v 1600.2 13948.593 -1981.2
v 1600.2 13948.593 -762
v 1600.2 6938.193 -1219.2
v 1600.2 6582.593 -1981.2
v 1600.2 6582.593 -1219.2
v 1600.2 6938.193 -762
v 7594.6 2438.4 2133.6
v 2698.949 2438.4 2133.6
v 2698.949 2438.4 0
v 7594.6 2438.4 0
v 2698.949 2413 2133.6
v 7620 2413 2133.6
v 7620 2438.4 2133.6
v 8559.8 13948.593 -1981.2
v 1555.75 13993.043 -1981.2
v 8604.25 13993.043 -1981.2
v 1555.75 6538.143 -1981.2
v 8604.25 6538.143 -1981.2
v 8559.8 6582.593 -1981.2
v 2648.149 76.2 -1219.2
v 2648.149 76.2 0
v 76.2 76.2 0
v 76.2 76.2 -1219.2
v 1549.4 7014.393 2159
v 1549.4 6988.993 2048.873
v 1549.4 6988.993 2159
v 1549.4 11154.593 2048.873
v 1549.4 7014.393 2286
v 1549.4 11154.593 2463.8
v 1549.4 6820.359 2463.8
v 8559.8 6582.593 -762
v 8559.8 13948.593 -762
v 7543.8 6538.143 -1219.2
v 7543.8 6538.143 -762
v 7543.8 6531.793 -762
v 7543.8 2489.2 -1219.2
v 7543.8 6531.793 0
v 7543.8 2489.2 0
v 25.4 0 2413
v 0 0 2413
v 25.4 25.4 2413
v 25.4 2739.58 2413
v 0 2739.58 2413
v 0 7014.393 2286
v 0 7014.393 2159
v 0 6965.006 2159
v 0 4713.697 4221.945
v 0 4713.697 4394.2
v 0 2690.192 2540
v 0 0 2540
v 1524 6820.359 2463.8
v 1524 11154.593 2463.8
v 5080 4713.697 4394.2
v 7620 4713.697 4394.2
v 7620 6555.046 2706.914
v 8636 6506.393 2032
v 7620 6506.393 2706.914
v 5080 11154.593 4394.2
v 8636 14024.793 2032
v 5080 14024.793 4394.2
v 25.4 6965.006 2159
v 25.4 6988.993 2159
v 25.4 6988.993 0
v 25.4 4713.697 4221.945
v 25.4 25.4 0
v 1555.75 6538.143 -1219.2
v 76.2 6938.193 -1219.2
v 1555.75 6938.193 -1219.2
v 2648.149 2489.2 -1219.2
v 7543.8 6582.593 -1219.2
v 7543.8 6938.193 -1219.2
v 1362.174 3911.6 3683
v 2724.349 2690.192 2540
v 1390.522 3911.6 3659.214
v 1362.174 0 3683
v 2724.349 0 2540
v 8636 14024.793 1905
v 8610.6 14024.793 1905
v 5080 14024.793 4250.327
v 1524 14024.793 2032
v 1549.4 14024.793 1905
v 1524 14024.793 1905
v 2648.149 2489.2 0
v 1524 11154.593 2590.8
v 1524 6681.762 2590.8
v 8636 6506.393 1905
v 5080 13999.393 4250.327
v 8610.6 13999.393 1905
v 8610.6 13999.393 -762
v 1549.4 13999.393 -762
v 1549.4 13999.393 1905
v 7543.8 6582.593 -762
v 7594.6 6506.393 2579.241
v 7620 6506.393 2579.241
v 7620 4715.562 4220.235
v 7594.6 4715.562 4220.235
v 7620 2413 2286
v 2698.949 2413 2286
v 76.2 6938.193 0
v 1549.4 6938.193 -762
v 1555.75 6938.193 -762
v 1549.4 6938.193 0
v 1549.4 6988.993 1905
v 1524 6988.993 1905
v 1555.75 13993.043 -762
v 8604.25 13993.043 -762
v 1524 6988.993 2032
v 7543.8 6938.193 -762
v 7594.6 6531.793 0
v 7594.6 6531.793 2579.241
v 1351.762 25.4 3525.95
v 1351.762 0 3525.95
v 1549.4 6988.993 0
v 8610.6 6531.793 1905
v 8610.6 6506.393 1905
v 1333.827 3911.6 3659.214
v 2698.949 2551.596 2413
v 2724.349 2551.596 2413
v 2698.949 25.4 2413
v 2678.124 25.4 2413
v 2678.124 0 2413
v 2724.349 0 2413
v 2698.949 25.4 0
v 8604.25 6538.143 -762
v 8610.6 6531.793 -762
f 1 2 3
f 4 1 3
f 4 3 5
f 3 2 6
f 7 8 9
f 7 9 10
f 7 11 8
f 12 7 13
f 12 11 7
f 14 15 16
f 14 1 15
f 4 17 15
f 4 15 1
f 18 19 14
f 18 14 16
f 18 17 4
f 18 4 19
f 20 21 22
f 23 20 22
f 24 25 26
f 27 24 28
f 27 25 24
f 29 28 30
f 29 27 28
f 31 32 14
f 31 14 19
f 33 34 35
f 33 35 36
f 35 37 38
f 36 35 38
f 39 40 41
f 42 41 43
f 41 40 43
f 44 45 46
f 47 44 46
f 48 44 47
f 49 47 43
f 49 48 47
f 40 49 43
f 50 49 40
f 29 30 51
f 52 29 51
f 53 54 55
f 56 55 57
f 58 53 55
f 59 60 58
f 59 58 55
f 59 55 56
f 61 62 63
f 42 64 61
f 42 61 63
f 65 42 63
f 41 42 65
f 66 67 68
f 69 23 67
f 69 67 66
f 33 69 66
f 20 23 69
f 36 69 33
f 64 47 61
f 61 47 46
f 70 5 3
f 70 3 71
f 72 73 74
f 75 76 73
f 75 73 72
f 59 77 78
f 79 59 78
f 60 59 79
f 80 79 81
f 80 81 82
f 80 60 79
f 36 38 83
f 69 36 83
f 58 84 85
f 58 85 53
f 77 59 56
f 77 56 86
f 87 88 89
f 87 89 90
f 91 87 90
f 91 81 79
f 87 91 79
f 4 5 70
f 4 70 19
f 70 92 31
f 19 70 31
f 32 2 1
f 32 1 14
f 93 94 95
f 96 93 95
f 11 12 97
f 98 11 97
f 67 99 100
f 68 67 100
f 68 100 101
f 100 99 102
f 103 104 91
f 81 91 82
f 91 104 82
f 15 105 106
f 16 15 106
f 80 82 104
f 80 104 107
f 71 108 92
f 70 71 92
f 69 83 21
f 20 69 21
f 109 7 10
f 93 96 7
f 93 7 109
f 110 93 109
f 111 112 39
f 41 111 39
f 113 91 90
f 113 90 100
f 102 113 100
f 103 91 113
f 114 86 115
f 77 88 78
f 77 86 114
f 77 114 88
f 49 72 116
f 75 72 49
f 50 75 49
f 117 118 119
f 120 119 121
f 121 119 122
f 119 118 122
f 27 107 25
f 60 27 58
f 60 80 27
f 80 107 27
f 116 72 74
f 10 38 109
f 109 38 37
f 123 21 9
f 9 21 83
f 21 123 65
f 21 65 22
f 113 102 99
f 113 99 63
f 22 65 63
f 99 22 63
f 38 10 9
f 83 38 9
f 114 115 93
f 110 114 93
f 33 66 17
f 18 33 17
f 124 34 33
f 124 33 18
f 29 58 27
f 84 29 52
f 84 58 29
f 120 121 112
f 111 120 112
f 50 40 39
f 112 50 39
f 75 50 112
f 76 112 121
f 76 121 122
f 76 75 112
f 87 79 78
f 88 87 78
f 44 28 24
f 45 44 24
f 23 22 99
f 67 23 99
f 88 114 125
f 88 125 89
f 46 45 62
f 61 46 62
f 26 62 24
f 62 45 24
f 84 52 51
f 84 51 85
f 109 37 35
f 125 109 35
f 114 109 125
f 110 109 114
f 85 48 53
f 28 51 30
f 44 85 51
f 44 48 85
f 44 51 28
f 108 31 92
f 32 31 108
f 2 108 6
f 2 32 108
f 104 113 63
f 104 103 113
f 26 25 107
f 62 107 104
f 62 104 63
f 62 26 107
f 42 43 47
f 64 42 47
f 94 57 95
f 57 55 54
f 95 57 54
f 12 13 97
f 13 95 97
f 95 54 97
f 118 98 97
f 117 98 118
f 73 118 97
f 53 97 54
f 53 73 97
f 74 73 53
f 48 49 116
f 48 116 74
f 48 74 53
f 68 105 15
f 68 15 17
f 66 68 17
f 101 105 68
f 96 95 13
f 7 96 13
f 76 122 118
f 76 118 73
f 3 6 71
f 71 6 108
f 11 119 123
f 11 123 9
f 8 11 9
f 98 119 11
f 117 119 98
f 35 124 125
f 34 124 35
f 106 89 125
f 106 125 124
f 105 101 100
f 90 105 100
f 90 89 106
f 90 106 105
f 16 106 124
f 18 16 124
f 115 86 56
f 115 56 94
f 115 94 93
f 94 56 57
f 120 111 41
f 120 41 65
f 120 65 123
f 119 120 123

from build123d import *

# Parameters (mm, degrees)
F1_DEPTH  = 3911.6
F3_DEPTH  = 7620
F5_DEPTH  = 7010.4
F6_DEPTH  = 508
F7_DEPTH  = 1792.6965819542
F9_DEPTH  = 25.4
F11_DEPTH = 25.4
F13_DEPTH = 25.4
F14_W     = 4921.0512873296
F14_H     = 2133.6
F15_DEPTH = 25.4
F17_DEPTH = 25.4
F18_W     = 7518.4
F18_H     = 2667
F19_DEPTH = 25.4
F21_DEPTH = 25.4
F23_DEPTH = 25.4
F25_DEPTH = 25.4
F27_DEPTH = 25.4
F29_DEPTH = 25.4
F32_DEPTH = 6440.8965819542
F33_W     = 7048.5
F33_H     = 7454.9
F33_W_2   = 6959.6
F33_H_2   = 7366
F34_DEPTH = 1219.2
F36_DEPTH = 1219.2


with BuildPart() as f1:
    # F0 (on Front) → F1 (new body)
    with BuildSketch(Plane.XZ):
        Polygon((0, 2540), (0, 0), (2724.3487126704, 0), (2724.3487126704, 2540), (1362.1743563352, 3683), align=None)
    extrude(amount=-F1_DEPTH)

    # F2 (on face) → F3 (join)
    with BuildSketch(Plane(origin=(0, 0, 0), x_dir=(0, -1, 0), z_dir=(-1, 0, 0))):
        Polygon((-4713.6965819542, 4394.2), (-7014.3931639085, 2286), (-7014.3931639085, 0), (-2413, 0), (-2413, 2286), align=None)
    extrude(amount=-F3_DEPTH)

    # F4 (on face) → F5 (join)
    with BuildSketch(Plane(origin=(0, 7014.3931639085, 0), x_dir=(-1, 0, 0), z_dir=(0, 1, 0))):
        Polygon((-8636, -762), (-1524, -762), (-1524, 2032), (-5080, 4394.2), (-8636, 2032), align=None)
    extrude(amount=F5_DEPTH)

    # F6 (add): a face of the model
    f6_faces = [f1.faces().sort_by_distance(p)[0] for p in [
        (8548.1552833461, 7014.3931639085, 635),
    ]]
    extrude(f6_faces, amount=F6_DEPTH)

    # F7 (add, through all): a face of the model
    f7_faces = [f1.faces().sort_by_distance(p)[0] for p in [
        (5080, 6506.3931639085, 3299.0641576006),
    ]]
    extrude(f7_faces, amount=F7_DEPTH)

    # F8 (on face) → F9 (cut)
    with BuildSketch(Plane(origin=(0, 0, 0), x_dir=(0, -1, 0), z_dir=(-1, 0, 0))):
        Polygon((-4713.6965819542, 4221.9446034765), (-7014.3931639085, 2113.7446034765), (-7014.3931639085, 0), (0, 0), (0, 2413), (-2739.5799582169, 2413), align=None)
    extrude(amount=-F9_DEPTH, mode=Mode.SUBTRACT)

    # F10 (on face) → F11 (cut)
    with BuildSketch(Plane.XZ):
        Polygon((1351.7622464593, 3525.9500718114), (25.4, 2413), (25.4, 0), (2724.3487126704, 0), (2724.3487126704, 2413), (2678.1244929186, 2413), align=None)
    extrude(amount=-F11_DEPTH, mode=Mode.SUBTRACT)

    # F12 (on face) → F13 (cut)
    with BuildSketch(Plane.YZ.offset(2724.3487126704)):
        Polygon((2551.5961796358, 2413), (25.4, 2413), (25.4, 0), (2413, 0), (2413, 2286), align=None)
    extrude(amount=-F13_DEPTH, mode=Mode.SUBTRACT)

    # F14 (on face) → F15 (cut)
    with BuildSketch(Plane.XZ.offset(-2413)):
        with Locations((5159.4743563352, 1066.8)):
            Rectangle(F14_W, F14_H)
    extrude(amount=-F15_DEPTH, mode=Mode.SUBTRACT)

    # F16 (on face) → F17 (cut)
    with BuildSketch(Plane.YZ.offset(7620)):
        Polygon((4715.5624004452, 4220.2348958282), (2438.4, 2133.6), (2438.4, 0), (6506.3931639085, 0), (6506.3931639085, 2579.2408398774), align=None)
    extrude(amount=-F17_DEPTH, mode=Mode.SUBTRACT)

    # F18 (on face) → F19 (cut)
    with BuildSketch(Plane.YZ.offset(8636)):
        with Locations((10265.5931639085, 571.5)):
            Rectangle(F18_W, F18_H)
    extrude(amount=-F19_DEPTH, mode=Mode.SUBTRACT)

    # F20 (on face) → F21 (cut)
    with BuildSketch(Plane.XZ.offset(-6506.3931639085)):
        Polygon((8610.6, -762), (8610.6, 1905), (7594.6, 2579.2408398774), (7594.6, 0), (1524, 0), (1524, -762), align=None)
    extrude(amount=-F21_DEPTH, mode=Mode.SUBTRACT)

    # F22 (on face) → F23 (cut)
    with BuildSketch(Plane(origin=(1524, 0, 0), x_dir=(0, -1, 0), z_dir=(-1, 0, 0))):
        Polygon((-7014.3931639085, 1905), (-14024.7931639085, 1905), (-14024.7931639085, -762), (-6531.7931639085, -762), (-6531.7931639085, 0), (-7014.3931639085, 0), align=None)
    extrude(amount=-F23_DEPTH, mode=Mode.SUBTRACT)

    # F24 (on face) → F25 (cut)
    with BuildSketch(Plane(origin=(0, 14024.7931639085, 0), x_dir=(-1, 0, 0), z_dir=(0, 1, 0))):
        Polygon((-5080, 4250.3271428571), (-8610.6, 1905), (-8610.6, -762), (-1549.4, -762), (-1549.4, 1905), align=None)
    extrude(amount=-F25_DEPTH, mode=Mode.SUBTRACT)

    # F26 (on face) → F27 (cut)
    with BuildSketch(Plane(origin=(0, 7014.3931639085, 0), x_dir=(-1, 0, 0), z_dir=(0, 1, 0))):
        Polygon((0, 2159), (-1715.1827956989, 2159), (-1524, 2032), (-1524, 1905), (-1549.4, 1905), (-1549.4, 0), (-25.4, 0), (-25.4, 2113.7446034765), (0, 2113.7446034765), align=None)
    extrude(amount=-F27_DEPTH, mode=Mode.SUBTRACT)

    # F28 (on face) → F29 (cut, through all)
    with BuildSketch(Plane(origin=(0, 0, 0), x_dir=(0, -1, 0), z_dir=(-1, 0, 0))):
        Polygon((-6965.0055649631, 2159), (-6988.9931639085, 2159), (-6988.9931639085, 2137.0194152966), align=None)
    extrude(amount=-F29_DEPTH, mode=Mode.SUBTRACT)

    # F31 (on offset) → F32 (join, through all)
    with BuildSketch(Plane(origin=(0, 11154.5931639085, 0), x_dir=(-1, 0, 0), z_dir=(0, 1, 0))):
        Polygon((-1524, 2590.8), (-5080, 4394.2), (-1549.4, 2048.8728571429), (-1549.4, 2463.8), (-1524, 2463.8), align=None)
    extrude(amount=-F32_DEPTH)

    # F33 (on face) → F34 (join)
    with BuildSketch(Plane(origin=(0, 0, -762), x_dir=(1, 0, 0), z_dir=(0, 0, -1))):
        with Locations((5080, -10265.5931639085)):
            Rectangle(F33_W, F33_H)
        with Locations((5080, -10265.5931639085)):
            Rectangle(F33_W_2, F33_H_2, mode=Mode.SUBTRACT)
    extrude(amount=F34_DEPTH)

    # F35 (on face) → F36 (join)
    with BuildSketch(Plane(origin=(0, 0, 0), x_dir=(1, 0, 0), z_dir=(0, 0, -1))):
        Polygon((2648.1487126704, -76.2), (76.2, -76.2), (76.2, -6938.1931639085), (7543.8, -6938.1931639085), (7543.8, -2489.2), (2648.1487126704, -2489.2), align=None)
    extrude(amount=F36_DEPTH)


solid = f1.part
